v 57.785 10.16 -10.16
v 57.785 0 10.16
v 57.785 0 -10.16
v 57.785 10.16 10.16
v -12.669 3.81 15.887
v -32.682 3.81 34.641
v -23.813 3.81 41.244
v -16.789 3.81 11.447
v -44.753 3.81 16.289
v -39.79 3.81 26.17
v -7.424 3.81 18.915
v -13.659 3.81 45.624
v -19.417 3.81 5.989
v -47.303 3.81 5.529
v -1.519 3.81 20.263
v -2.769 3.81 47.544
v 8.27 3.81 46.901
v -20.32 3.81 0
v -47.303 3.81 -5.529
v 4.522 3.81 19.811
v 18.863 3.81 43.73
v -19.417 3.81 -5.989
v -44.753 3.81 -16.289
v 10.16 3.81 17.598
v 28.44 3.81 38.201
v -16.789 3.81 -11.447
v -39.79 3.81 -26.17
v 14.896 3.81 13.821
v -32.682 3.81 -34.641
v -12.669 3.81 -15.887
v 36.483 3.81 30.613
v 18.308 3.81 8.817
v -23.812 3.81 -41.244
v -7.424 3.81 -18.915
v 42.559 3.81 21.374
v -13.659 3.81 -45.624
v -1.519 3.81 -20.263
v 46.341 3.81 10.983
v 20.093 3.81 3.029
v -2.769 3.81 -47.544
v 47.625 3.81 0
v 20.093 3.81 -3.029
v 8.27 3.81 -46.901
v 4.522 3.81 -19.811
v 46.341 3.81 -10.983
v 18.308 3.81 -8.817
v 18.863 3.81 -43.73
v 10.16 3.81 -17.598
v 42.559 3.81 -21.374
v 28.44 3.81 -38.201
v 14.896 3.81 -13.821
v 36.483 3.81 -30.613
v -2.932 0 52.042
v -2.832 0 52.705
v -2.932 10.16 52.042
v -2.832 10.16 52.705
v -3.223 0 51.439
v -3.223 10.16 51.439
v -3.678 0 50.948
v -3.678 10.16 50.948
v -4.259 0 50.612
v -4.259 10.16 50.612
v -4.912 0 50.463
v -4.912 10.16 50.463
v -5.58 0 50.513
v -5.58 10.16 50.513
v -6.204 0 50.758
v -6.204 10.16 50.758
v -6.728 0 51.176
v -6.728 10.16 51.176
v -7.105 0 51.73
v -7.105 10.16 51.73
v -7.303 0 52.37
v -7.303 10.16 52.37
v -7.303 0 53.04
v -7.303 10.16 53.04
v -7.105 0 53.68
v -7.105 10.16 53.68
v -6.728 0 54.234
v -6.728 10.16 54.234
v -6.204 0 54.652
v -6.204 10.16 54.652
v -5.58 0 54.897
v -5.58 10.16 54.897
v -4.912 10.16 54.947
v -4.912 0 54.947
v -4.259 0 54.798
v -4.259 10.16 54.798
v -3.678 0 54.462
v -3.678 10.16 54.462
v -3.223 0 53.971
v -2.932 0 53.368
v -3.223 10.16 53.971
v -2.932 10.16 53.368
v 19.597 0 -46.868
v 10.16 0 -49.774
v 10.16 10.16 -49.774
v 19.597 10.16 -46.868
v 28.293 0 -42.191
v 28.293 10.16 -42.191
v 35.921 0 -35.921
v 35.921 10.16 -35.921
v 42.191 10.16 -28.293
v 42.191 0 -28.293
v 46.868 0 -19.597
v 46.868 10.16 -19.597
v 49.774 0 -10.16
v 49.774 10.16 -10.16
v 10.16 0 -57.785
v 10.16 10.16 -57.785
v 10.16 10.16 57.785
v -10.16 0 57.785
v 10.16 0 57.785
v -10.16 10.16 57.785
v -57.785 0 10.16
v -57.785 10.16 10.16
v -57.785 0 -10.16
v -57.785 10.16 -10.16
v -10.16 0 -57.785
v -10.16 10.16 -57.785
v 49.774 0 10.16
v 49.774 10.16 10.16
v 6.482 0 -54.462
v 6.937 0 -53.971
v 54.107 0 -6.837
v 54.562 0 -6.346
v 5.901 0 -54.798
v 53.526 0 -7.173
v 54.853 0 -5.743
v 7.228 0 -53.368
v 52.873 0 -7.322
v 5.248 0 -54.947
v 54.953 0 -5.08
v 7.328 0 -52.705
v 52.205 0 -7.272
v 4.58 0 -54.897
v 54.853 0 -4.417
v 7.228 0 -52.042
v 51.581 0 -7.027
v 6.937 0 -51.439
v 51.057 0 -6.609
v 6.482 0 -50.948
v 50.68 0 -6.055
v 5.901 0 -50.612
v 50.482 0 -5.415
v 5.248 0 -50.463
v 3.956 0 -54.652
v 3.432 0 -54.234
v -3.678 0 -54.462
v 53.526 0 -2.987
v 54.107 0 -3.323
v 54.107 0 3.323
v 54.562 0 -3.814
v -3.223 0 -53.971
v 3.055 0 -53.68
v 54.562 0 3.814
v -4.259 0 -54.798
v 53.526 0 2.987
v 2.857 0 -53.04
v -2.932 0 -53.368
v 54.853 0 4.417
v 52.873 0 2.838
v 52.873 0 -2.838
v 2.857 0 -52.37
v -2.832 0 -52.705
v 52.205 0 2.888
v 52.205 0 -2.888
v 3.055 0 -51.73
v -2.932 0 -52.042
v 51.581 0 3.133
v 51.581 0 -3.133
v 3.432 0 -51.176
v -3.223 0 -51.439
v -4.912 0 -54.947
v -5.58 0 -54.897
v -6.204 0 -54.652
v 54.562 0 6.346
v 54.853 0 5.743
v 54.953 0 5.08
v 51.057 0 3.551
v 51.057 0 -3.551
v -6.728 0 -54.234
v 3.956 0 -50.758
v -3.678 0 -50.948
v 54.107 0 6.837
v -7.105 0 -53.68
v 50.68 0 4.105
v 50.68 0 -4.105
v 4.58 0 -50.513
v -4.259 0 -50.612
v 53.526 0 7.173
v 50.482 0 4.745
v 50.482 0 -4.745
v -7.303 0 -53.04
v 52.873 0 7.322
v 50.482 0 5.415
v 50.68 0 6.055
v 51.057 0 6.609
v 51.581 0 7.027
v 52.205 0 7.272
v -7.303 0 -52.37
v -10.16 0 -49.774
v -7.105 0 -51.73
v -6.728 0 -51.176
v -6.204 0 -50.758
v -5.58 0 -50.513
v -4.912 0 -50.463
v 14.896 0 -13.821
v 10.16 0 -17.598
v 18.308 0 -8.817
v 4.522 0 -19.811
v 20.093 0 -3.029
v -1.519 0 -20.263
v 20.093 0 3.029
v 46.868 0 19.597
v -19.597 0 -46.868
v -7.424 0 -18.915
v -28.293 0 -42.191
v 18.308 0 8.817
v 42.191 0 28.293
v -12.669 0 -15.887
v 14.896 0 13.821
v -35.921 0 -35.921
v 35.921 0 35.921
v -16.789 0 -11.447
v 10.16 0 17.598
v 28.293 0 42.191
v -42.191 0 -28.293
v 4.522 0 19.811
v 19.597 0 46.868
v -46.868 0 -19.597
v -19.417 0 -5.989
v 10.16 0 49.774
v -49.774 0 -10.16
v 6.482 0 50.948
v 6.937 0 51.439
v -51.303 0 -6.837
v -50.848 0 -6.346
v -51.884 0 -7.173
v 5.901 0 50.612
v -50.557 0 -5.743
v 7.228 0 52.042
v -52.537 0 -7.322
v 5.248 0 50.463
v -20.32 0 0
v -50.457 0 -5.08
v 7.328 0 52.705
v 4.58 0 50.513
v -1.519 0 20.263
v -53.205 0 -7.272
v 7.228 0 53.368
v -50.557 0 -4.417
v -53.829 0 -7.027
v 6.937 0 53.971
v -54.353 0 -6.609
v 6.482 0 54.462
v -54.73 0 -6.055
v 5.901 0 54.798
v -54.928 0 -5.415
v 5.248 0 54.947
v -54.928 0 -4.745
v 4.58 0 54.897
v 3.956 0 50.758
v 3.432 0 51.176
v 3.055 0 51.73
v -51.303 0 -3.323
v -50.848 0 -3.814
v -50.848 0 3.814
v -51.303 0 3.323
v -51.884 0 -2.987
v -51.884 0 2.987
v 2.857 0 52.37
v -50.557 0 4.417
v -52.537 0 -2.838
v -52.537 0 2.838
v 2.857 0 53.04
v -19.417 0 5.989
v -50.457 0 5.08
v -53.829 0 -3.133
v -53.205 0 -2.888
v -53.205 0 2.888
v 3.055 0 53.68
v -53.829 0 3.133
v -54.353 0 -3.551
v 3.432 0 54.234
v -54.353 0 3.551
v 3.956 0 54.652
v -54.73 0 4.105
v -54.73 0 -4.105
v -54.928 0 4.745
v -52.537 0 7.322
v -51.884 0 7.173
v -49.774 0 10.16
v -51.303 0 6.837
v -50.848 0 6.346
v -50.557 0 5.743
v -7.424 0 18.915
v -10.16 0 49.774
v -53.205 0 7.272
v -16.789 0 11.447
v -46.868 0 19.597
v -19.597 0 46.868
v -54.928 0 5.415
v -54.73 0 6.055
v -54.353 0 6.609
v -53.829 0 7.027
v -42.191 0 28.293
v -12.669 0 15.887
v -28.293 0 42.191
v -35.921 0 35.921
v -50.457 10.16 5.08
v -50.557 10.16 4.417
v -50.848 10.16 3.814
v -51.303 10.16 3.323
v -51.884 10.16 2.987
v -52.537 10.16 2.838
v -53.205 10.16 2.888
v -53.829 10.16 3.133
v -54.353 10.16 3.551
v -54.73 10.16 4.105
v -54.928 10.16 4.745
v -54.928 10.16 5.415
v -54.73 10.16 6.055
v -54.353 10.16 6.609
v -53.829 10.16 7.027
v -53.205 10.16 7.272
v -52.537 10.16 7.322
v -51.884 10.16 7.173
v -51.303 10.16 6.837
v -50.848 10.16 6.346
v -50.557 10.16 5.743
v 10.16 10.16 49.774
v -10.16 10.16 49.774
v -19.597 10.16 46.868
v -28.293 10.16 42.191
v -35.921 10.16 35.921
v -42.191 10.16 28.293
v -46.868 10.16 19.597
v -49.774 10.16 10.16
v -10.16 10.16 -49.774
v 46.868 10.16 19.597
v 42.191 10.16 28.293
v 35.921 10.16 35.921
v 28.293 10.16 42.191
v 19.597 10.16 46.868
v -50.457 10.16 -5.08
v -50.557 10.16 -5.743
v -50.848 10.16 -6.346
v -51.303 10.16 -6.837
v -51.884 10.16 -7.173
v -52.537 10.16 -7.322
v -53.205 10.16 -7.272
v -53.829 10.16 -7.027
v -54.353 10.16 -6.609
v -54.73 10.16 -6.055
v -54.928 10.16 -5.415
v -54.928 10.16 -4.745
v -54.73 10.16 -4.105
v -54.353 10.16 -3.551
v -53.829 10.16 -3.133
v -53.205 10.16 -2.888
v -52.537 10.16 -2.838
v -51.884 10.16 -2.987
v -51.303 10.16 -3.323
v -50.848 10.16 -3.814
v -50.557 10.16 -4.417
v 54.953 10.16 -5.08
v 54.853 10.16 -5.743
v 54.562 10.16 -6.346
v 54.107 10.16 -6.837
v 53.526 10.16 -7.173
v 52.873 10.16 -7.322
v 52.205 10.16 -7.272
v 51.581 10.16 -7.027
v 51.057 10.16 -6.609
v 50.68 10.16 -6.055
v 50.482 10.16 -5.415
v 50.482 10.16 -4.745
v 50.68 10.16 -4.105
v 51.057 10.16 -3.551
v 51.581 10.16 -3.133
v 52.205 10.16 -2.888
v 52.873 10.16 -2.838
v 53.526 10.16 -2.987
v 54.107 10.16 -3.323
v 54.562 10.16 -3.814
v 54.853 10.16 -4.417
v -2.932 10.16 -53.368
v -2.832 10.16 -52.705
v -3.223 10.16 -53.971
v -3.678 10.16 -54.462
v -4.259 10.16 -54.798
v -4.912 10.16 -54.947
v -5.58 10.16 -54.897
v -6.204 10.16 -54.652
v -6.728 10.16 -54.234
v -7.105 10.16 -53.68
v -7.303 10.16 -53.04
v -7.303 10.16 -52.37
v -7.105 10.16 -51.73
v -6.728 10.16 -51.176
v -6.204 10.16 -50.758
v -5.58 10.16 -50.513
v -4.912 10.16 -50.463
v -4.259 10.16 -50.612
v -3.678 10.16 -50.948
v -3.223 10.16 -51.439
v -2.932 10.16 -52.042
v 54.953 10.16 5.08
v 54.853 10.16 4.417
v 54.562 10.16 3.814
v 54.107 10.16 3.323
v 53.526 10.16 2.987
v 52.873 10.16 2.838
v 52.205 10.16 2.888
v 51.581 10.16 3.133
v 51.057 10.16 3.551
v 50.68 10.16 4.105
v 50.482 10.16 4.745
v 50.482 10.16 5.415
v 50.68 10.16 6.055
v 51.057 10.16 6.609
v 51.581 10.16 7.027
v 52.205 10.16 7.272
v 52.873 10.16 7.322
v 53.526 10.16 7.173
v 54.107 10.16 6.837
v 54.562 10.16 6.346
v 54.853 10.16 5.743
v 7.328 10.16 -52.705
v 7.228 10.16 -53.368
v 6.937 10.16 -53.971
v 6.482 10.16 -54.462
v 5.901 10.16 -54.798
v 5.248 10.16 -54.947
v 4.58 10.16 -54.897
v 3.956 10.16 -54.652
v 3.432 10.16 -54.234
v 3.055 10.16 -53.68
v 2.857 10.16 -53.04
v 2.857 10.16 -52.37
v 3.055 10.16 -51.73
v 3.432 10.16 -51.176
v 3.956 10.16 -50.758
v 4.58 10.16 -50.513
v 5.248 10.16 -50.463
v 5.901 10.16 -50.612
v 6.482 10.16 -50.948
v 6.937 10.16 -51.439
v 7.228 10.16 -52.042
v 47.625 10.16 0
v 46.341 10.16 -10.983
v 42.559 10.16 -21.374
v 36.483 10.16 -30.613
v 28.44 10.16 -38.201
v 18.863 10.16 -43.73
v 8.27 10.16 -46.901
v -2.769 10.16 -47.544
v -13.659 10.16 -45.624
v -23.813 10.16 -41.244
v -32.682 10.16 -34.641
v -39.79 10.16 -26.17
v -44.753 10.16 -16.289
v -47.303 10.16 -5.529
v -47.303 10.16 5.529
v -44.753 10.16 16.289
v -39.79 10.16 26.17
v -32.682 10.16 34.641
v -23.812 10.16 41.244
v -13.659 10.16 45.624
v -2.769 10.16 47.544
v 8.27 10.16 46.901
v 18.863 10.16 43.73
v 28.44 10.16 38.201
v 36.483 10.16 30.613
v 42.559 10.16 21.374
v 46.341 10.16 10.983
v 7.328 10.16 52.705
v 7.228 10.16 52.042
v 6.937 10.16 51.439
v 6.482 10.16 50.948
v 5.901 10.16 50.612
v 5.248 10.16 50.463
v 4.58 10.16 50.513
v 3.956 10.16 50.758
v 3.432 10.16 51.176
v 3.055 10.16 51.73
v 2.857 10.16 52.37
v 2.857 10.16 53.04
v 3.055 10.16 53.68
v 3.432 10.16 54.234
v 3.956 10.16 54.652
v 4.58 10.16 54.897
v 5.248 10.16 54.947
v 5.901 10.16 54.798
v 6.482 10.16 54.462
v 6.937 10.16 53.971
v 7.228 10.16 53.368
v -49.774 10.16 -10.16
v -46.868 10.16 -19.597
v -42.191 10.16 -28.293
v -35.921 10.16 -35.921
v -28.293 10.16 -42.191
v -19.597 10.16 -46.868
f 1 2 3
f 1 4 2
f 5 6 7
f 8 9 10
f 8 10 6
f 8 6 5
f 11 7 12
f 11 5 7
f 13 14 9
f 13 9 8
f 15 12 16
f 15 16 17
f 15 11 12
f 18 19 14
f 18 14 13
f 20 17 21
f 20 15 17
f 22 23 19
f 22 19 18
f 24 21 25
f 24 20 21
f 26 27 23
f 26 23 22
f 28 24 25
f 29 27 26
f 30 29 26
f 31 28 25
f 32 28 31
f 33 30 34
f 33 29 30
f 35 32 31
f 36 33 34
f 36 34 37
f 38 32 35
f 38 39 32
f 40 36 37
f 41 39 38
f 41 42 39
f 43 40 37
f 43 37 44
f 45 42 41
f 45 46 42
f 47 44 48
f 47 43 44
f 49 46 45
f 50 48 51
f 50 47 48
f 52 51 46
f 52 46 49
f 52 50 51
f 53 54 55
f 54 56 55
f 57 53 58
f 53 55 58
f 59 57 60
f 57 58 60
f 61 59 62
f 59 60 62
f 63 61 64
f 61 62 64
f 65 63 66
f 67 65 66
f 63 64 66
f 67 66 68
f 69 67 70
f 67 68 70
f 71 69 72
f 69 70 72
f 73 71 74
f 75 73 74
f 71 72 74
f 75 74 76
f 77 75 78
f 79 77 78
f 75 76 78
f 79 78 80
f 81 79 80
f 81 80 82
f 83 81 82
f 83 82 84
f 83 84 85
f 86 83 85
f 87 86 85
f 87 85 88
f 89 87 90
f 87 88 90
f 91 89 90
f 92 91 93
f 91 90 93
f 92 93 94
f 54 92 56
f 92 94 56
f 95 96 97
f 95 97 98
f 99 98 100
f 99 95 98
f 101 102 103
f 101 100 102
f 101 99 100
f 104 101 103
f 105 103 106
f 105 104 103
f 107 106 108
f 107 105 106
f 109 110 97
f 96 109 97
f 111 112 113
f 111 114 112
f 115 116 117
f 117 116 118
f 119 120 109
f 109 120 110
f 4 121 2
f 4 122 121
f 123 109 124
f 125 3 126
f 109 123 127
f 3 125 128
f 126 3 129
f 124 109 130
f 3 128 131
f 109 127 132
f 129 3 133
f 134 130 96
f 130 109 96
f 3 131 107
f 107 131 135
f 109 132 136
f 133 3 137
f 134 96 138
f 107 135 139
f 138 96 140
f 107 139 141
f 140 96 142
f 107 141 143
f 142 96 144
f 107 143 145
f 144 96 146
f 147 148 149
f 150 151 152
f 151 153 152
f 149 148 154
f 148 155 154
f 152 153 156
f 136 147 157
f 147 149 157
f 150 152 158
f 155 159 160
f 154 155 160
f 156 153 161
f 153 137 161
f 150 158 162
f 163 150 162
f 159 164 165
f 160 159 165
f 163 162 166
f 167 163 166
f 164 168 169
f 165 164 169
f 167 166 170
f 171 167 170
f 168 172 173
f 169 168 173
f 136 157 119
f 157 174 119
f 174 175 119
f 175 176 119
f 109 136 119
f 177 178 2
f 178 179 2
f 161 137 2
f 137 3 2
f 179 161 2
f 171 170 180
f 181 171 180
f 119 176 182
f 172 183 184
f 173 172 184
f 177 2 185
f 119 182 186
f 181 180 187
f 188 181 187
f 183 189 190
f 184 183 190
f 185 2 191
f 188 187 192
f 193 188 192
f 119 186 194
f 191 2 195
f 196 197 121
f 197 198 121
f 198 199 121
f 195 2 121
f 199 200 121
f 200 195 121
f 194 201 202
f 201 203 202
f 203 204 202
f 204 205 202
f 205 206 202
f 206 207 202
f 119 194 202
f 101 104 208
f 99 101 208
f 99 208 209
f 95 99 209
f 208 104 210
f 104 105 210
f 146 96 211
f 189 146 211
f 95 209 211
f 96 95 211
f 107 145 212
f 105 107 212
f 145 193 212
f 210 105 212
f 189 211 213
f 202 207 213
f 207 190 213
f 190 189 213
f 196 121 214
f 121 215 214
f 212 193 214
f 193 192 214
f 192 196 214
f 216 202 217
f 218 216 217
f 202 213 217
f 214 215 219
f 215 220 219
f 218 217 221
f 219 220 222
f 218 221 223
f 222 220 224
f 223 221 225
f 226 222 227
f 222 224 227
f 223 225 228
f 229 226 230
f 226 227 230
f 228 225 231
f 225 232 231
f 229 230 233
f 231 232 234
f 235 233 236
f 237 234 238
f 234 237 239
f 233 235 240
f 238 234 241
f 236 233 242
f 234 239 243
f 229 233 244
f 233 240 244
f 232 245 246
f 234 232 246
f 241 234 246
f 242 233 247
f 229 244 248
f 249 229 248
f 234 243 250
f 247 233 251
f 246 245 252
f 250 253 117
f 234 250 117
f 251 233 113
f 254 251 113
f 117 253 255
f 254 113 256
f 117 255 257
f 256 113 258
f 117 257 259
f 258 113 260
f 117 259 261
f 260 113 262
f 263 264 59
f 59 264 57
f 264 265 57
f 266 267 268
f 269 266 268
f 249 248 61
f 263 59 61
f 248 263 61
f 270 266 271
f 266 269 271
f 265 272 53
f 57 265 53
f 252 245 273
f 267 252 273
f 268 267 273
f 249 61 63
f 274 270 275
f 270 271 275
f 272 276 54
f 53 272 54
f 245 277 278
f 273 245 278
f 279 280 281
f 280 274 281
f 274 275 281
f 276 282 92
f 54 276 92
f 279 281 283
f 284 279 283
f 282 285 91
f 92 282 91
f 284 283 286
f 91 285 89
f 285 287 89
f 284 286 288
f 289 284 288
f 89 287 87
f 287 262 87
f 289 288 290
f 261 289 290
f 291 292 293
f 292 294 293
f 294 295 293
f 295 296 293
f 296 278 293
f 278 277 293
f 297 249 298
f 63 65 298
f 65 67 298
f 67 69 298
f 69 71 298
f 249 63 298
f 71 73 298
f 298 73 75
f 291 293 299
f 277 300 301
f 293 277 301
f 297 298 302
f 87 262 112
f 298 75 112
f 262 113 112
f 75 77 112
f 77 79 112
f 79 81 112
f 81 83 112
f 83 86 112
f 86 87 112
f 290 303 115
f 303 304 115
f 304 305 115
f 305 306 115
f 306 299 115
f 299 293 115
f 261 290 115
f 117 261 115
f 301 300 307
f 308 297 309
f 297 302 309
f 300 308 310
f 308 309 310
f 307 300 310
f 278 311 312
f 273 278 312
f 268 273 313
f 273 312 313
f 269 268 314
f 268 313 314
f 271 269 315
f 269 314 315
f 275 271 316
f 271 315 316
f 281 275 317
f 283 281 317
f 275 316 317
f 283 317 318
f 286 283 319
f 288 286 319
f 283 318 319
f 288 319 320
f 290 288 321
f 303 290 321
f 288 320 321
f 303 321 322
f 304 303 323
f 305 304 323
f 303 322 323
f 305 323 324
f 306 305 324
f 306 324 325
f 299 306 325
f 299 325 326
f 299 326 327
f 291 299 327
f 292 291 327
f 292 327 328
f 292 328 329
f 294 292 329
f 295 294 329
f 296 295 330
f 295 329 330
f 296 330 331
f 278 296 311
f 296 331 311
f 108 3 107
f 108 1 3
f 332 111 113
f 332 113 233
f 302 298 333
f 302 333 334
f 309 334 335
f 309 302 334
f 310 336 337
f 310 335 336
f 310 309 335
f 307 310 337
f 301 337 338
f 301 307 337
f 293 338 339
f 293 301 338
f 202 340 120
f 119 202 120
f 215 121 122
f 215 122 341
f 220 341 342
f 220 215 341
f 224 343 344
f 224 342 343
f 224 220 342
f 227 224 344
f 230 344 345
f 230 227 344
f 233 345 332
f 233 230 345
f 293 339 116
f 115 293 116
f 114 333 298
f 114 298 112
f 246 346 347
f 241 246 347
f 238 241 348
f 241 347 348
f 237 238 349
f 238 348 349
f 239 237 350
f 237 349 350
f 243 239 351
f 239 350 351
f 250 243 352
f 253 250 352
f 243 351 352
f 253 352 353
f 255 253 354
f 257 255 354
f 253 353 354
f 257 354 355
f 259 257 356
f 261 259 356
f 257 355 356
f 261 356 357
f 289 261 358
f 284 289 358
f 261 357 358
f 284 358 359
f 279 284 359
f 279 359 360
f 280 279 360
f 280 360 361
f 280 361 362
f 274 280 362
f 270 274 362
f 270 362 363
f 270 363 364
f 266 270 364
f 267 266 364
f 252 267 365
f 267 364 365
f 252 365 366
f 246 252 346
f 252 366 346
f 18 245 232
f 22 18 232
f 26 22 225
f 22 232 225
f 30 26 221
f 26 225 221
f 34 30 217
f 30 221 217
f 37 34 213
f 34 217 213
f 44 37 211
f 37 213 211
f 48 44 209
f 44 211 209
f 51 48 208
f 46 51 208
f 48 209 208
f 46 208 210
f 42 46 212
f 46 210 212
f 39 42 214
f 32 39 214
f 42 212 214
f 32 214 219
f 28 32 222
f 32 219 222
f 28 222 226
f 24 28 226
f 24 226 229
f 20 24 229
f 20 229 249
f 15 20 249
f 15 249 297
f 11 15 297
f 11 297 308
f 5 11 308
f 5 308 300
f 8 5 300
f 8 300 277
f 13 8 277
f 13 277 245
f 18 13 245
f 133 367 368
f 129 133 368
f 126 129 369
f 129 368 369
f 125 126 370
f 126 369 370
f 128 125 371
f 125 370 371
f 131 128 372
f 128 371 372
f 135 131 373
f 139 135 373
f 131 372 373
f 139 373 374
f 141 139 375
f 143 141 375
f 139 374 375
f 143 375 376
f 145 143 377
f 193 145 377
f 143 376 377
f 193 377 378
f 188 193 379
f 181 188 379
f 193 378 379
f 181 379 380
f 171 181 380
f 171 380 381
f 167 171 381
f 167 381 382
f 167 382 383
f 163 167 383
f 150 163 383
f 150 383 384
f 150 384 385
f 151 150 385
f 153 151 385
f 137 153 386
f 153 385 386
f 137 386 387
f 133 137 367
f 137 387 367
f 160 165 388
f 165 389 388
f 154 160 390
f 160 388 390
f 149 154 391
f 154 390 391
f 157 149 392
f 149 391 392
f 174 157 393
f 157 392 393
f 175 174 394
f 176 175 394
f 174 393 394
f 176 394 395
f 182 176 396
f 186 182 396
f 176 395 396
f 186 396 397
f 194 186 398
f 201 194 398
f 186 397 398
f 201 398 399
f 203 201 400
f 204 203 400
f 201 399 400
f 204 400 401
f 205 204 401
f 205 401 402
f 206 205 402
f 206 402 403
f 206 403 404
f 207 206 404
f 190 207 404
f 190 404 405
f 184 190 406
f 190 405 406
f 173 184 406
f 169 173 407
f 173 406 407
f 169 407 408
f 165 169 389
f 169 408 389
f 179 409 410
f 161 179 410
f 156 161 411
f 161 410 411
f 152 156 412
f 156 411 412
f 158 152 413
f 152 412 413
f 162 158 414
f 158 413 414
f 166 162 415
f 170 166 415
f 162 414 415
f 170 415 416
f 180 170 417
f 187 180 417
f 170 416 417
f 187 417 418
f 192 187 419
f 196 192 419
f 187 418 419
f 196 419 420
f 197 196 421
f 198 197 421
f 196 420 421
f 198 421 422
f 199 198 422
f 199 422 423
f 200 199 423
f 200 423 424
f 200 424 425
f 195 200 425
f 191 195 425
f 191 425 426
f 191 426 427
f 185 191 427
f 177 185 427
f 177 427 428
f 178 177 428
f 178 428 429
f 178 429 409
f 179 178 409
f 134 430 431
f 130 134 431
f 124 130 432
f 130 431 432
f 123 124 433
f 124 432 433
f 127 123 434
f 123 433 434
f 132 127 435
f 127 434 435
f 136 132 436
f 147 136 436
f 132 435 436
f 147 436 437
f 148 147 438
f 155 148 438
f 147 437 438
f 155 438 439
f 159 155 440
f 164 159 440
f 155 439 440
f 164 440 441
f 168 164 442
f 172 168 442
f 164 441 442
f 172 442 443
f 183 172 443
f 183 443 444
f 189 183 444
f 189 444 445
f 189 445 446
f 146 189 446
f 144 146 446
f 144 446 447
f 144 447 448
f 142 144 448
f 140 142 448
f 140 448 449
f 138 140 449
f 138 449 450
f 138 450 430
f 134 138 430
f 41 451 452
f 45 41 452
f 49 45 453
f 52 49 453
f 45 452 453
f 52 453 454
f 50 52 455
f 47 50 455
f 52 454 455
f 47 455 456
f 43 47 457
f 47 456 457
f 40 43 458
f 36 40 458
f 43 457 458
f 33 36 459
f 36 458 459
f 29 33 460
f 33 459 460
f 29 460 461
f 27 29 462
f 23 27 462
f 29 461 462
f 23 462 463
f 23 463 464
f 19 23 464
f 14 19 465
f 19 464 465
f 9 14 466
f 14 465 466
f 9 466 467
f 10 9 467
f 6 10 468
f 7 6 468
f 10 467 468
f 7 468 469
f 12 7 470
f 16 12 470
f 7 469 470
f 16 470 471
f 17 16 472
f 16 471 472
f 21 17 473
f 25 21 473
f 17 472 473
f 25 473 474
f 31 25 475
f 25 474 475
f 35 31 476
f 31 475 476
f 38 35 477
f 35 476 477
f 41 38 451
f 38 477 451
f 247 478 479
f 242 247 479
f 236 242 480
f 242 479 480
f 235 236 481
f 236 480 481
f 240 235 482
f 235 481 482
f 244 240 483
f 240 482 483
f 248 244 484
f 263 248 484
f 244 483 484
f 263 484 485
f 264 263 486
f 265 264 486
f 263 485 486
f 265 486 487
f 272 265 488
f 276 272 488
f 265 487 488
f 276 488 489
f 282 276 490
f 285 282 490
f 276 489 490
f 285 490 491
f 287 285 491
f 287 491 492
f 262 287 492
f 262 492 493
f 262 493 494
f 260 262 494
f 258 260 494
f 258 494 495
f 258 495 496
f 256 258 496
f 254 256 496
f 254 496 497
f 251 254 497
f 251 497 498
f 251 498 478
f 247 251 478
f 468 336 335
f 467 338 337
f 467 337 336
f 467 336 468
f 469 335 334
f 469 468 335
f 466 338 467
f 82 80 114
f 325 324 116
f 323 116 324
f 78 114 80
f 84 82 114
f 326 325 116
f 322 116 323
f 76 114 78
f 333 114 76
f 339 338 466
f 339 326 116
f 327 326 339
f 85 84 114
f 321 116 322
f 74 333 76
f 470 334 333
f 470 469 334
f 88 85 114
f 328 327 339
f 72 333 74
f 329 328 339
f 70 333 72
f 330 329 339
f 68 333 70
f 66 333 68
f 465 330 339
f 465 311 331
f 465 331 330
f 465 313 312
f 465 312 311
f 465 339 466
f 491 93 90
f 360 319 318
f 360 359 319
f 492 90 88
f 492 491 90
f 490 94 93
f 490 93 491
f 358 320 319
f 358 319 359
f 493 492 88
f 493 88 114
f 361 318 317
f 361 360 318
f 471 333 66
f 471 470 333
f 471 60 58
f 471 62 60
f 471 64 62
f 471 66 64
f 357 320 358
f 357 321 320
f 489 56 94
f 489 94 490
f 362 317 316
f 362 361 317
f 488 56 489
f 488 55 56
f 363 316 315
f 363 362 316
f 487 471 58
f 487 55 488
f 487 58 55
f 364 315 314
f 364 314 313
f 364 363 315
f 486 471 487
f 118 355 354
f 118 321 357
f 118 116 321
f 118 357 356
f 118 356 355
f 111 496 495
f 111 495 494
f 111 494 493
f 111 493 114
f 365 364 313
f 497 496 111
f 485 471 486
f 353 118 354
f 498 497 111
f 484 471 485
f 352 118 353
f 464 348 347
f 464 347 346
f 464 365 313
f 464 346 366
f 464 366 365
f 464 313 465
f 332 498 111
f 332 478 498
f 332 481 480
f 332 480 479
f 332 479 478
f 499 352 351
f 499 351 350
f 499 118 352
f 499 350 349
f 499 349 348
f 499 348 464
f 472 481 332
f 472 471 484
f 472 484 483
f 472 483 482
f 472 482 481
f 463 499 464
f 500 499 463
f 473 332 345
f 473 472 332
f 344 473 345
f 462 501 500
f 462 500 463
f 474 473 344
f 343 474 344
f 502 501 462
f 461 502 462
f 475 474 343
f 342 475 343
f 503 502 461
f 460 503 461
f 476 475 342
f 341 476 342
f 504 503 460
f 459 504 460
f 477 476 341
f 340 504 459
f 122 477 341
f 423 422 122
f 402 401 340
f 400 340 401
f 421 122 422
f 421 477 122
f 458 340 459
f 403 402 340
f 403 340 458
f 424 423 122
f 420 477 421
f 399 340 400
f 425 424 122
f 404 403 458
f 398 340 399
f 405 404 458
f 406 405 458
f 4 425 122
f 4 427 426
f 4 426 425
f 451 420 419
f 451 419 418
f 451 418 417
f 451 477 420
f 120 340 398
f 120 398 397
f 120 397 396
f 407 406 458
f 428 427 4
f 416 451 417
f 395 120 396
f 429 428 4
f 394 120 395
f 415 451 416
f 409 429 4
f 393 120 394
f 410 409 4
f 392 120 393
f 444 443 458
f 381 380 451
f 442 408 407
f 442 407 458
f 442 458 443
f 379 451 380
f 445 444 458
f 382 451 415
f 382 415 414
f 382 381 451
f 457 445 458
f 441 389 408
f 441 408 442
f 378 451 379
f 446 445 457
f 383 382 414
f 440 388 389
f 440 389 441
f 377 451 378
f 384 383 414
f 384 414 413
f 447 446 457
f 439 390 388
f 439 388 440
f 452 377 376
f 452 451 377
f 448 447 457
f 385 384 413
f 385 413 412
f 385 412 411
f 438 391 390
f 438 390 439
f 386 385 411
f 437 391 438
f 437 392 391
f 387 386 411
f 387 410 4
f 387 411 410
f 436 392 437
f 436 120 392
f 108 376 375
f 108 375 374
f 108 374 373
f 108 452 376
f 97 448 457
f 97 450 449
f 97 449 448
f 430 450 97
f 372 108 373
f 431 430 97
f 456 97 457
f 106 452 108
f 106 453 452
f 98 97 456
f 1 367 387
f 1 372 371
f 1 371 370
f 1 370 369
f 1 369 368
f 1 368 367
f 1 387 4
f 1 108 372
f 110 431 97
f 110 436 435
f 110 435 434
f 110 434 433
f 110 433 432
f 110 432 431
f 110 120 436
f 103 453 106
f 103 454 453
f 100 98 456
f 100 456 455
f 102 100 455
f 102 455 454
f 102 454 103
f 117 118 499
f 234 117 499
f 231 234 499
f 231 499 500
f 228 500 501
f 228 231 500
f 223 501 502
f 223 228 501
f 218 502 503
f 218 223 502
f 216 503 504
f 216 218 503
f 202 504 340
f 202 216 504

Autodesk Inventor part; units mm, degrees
ref_plane "YZ Plane" through (0, 0, 0) normal (1, 0, 0) x (0, 1, 0)
ref_plane "XZ Plane" through (0, 0, 0) normal (0, 1, 0) x (-1, 0, 0)
ref_plane "XY Plane" through (0, 0, 0) normal (0, 0, 1) x (1, 0, 0)
sketch "Sketch1" plane through (0, 0, 0) normal (0, 1, 0) x (-1, 0, 0)
  circle A0 centre (0, 0) radius 50.8
  circle A1 centre (0, 0) radius 20.32
  dimension "d0" = 101.6
  dimension "d1" = 40.64
extrude "Extrusion1" add sketch "Sketch1" along normal blind 10.16
sketch "Sketch2" plane through (0, 10.16, 0) normal (0, 1, 0) x (1, 0, 0)
  circle A0 centre (0, 0) radius 47.625
  dimension "d4" = 95.25
extrude "Extrusion2" cut sketch "Sketch2" against normal blind 6.35
sketch "Sketch3" plane through (0, 10.16, 0) normal (0, 1, 0) x (1, 0, 0)
  circle A0 centre (0, 0) radius 47.625 projected
  line L0 (-47.625, 0) -> (-57.785, 0)
  line L1 (-57.785, 0) -> (-57.785, 10.16)
  line L2 (-57.785, 10.16) -> (-47.625, 10.16)
  line L3 (-47.625, 10.16) -> (-47.625, -10.16)
  line L4 (-47.625, -10.16) -> (-57.785, -10.16)
  line L5 (-57.785, -10.16) -> (-57.785, 0)
  line L6 (0, 47.625) -> (0, 57.785)
  line L7 (0, 57.785) -> (10.16, 57.785)
  line L8 (10.16, 57.785) -> (10.16, 47.625)
  line L9 (10.16, 47.625) -> (-10.16, 47.625)
  line L10 (-10.16, 47.625) -> (-10.16, 57.785)
  line L11 (-10.16, 57.785) -> (0, 57.785)
  line L12 (47.625, 0) -> (57.785, 0)
  line L13 (57.785, 0) -> (57.785, 10.16)
  line L14 (57.785, 10.16) -> (47.625, 10.16)
  line L15 (47.625, 10.16) -> (47.625, -10.16)
  line L16 (47.625, -10.16) -> (57.785, -10.16)
  line L17 (57.785, -10.16) -> (57.785, 0)
  line L18 (0, -47.625) -> (0, -57.785)
  line L19 (0, -57.785) -> (10.16, -57.785)
  line L20 (10.16, -57.785) -> (10.16, -47.625)
  line L21 (10.16, -47.625) -> (-10.16, -47.625)
  line L22 (-10.16, -47.625) -> (-10.16, -57.785)
  line L23 (-10.16, -57.785) -> (0, -57.785)
  dimension "d7" = 10.16
  dimension "d8" = 10.16
  dimension "d9" = 20.32
  dimension "d10" = 10.16
  dimension "d11" = 10.16
  dimension "d12" = 10.16
  dimension "d13" = 20.32
  dimension "d14" = 10.16
  dimension "d15" = 10.16
  dimension "d16" = 10.16
  dimension "d17" = 20.32
  dimension "d18" = 10.16
  dimension "d19" = 10.16
  dimension "d20" = 10.16
  dimension "d21" = 10.16
  dimension "d22" = 20.32
  dimension "d23" = 10.16
extrude "Extrusion3" add sketch "Sketch3" against normal up to surface (10.16 mm away) contours L21 L20 L19 L18 | L18 L23 L22 L21 | L3 L4 L5 L0 | L0 L1 L2 L3 | L9 L10 L11 L6 | L6 L7 L8 L9 | L15 L14 L13 L12 | L12 L17 L16 L15
sketch "Sketch4" plane through (0, 10.16, 0) normal (0, 1, 0) x (1, 0, 0)
  line L0 (-57.785, 10.16) -> (-57.785, -10.16) projected
  line L1 (-57.785, 10.16) -> (-52.705, 10.16)
  line L2 (-49.7736, 10.16) -> (-57.785, 10.16) projected
  line L3 (-52.705, 10.16) -> (-52.705, 5.08)
  line L4 (-52.705, 5.08) -> (-52.705, -5.08)
  line L5 (-10.16, 57.785) -> (-10.16, 49.7736) projected
  line L6 (-10.16, 57.785) -> (-10.16, 52.705)
  line L7 (-10.16, 52.705) -> (-5.08, 52.705)
  line L8 (-5.08, 52.705) -> (5.08, 52.705)
  line L9 (49.7736, 10.16) -> (57.785, 10.16) projected
  line L10 (57.785, 10.16) -> (52.705, 10.16)
  line L11 (52.705, 10.16) -> (52.705, 5.08)
  line L12 (52.705, 5.08) -> (52.705, -5.08)
  line L13 (10.16, -49.7736) -> (10.16, -57.785) projected
  line L14 (10.16, -57.785) -> (10.16, -52.705)
  line L15 (10.16, -52.705) -> (5.08, -52.705)
  line L16 (5.08, -52.705) -> (-5.08, -52.705)
  circle A0 centre (-52.705, -5.08) radius 2.2479
  circle A1 centre (-52.705, 5.08) radius 2.2479
  circle A2 centre (-5.08, 52.705) radius 2.2479
  circle A3 centre (5.08, 52.705) radius 2.2479
  circle A4 centre (52.705, 5.08) radius 2.2479
  circle A5 centre (52.705, -5.08) radius 2.2479
  circle A6 centre (-5.08, -52.705) radius 2.2479
  circle A7 centre (5.08, -52.705) radius 2.2479
  point P0 (0, 0)
  dimension "d26" = 5.08
  dimension "d27" = 5.08
  dimension "d28" = 10.16
  dimension "d29" = 5.08
  dimension "d30" = 5.08
  dimension "d31" = 10.16
  dimension "d32" = 5.08
  dimension "d33" = 5.08
  dimension "d34" = 10.16
  dimension "d35" = 5.08
  dimension "d36" = 5.08
  dimension "d37" = 10.16
  dimension "d38" = 4.4958
  dimension "d39" = 4.4958
  dimension "d40" = 4.4958
  dimension "d41" = 4.4958
  dimension "d42" = 4.4958
  dimension "d43" = 4.4958
  dimension "d44" = 4.4958
extrude "Extrusion4" cut sketch "Sketch4" against normal blind 25.4
properties part number "CO-0-01-PlanetaryCap"
